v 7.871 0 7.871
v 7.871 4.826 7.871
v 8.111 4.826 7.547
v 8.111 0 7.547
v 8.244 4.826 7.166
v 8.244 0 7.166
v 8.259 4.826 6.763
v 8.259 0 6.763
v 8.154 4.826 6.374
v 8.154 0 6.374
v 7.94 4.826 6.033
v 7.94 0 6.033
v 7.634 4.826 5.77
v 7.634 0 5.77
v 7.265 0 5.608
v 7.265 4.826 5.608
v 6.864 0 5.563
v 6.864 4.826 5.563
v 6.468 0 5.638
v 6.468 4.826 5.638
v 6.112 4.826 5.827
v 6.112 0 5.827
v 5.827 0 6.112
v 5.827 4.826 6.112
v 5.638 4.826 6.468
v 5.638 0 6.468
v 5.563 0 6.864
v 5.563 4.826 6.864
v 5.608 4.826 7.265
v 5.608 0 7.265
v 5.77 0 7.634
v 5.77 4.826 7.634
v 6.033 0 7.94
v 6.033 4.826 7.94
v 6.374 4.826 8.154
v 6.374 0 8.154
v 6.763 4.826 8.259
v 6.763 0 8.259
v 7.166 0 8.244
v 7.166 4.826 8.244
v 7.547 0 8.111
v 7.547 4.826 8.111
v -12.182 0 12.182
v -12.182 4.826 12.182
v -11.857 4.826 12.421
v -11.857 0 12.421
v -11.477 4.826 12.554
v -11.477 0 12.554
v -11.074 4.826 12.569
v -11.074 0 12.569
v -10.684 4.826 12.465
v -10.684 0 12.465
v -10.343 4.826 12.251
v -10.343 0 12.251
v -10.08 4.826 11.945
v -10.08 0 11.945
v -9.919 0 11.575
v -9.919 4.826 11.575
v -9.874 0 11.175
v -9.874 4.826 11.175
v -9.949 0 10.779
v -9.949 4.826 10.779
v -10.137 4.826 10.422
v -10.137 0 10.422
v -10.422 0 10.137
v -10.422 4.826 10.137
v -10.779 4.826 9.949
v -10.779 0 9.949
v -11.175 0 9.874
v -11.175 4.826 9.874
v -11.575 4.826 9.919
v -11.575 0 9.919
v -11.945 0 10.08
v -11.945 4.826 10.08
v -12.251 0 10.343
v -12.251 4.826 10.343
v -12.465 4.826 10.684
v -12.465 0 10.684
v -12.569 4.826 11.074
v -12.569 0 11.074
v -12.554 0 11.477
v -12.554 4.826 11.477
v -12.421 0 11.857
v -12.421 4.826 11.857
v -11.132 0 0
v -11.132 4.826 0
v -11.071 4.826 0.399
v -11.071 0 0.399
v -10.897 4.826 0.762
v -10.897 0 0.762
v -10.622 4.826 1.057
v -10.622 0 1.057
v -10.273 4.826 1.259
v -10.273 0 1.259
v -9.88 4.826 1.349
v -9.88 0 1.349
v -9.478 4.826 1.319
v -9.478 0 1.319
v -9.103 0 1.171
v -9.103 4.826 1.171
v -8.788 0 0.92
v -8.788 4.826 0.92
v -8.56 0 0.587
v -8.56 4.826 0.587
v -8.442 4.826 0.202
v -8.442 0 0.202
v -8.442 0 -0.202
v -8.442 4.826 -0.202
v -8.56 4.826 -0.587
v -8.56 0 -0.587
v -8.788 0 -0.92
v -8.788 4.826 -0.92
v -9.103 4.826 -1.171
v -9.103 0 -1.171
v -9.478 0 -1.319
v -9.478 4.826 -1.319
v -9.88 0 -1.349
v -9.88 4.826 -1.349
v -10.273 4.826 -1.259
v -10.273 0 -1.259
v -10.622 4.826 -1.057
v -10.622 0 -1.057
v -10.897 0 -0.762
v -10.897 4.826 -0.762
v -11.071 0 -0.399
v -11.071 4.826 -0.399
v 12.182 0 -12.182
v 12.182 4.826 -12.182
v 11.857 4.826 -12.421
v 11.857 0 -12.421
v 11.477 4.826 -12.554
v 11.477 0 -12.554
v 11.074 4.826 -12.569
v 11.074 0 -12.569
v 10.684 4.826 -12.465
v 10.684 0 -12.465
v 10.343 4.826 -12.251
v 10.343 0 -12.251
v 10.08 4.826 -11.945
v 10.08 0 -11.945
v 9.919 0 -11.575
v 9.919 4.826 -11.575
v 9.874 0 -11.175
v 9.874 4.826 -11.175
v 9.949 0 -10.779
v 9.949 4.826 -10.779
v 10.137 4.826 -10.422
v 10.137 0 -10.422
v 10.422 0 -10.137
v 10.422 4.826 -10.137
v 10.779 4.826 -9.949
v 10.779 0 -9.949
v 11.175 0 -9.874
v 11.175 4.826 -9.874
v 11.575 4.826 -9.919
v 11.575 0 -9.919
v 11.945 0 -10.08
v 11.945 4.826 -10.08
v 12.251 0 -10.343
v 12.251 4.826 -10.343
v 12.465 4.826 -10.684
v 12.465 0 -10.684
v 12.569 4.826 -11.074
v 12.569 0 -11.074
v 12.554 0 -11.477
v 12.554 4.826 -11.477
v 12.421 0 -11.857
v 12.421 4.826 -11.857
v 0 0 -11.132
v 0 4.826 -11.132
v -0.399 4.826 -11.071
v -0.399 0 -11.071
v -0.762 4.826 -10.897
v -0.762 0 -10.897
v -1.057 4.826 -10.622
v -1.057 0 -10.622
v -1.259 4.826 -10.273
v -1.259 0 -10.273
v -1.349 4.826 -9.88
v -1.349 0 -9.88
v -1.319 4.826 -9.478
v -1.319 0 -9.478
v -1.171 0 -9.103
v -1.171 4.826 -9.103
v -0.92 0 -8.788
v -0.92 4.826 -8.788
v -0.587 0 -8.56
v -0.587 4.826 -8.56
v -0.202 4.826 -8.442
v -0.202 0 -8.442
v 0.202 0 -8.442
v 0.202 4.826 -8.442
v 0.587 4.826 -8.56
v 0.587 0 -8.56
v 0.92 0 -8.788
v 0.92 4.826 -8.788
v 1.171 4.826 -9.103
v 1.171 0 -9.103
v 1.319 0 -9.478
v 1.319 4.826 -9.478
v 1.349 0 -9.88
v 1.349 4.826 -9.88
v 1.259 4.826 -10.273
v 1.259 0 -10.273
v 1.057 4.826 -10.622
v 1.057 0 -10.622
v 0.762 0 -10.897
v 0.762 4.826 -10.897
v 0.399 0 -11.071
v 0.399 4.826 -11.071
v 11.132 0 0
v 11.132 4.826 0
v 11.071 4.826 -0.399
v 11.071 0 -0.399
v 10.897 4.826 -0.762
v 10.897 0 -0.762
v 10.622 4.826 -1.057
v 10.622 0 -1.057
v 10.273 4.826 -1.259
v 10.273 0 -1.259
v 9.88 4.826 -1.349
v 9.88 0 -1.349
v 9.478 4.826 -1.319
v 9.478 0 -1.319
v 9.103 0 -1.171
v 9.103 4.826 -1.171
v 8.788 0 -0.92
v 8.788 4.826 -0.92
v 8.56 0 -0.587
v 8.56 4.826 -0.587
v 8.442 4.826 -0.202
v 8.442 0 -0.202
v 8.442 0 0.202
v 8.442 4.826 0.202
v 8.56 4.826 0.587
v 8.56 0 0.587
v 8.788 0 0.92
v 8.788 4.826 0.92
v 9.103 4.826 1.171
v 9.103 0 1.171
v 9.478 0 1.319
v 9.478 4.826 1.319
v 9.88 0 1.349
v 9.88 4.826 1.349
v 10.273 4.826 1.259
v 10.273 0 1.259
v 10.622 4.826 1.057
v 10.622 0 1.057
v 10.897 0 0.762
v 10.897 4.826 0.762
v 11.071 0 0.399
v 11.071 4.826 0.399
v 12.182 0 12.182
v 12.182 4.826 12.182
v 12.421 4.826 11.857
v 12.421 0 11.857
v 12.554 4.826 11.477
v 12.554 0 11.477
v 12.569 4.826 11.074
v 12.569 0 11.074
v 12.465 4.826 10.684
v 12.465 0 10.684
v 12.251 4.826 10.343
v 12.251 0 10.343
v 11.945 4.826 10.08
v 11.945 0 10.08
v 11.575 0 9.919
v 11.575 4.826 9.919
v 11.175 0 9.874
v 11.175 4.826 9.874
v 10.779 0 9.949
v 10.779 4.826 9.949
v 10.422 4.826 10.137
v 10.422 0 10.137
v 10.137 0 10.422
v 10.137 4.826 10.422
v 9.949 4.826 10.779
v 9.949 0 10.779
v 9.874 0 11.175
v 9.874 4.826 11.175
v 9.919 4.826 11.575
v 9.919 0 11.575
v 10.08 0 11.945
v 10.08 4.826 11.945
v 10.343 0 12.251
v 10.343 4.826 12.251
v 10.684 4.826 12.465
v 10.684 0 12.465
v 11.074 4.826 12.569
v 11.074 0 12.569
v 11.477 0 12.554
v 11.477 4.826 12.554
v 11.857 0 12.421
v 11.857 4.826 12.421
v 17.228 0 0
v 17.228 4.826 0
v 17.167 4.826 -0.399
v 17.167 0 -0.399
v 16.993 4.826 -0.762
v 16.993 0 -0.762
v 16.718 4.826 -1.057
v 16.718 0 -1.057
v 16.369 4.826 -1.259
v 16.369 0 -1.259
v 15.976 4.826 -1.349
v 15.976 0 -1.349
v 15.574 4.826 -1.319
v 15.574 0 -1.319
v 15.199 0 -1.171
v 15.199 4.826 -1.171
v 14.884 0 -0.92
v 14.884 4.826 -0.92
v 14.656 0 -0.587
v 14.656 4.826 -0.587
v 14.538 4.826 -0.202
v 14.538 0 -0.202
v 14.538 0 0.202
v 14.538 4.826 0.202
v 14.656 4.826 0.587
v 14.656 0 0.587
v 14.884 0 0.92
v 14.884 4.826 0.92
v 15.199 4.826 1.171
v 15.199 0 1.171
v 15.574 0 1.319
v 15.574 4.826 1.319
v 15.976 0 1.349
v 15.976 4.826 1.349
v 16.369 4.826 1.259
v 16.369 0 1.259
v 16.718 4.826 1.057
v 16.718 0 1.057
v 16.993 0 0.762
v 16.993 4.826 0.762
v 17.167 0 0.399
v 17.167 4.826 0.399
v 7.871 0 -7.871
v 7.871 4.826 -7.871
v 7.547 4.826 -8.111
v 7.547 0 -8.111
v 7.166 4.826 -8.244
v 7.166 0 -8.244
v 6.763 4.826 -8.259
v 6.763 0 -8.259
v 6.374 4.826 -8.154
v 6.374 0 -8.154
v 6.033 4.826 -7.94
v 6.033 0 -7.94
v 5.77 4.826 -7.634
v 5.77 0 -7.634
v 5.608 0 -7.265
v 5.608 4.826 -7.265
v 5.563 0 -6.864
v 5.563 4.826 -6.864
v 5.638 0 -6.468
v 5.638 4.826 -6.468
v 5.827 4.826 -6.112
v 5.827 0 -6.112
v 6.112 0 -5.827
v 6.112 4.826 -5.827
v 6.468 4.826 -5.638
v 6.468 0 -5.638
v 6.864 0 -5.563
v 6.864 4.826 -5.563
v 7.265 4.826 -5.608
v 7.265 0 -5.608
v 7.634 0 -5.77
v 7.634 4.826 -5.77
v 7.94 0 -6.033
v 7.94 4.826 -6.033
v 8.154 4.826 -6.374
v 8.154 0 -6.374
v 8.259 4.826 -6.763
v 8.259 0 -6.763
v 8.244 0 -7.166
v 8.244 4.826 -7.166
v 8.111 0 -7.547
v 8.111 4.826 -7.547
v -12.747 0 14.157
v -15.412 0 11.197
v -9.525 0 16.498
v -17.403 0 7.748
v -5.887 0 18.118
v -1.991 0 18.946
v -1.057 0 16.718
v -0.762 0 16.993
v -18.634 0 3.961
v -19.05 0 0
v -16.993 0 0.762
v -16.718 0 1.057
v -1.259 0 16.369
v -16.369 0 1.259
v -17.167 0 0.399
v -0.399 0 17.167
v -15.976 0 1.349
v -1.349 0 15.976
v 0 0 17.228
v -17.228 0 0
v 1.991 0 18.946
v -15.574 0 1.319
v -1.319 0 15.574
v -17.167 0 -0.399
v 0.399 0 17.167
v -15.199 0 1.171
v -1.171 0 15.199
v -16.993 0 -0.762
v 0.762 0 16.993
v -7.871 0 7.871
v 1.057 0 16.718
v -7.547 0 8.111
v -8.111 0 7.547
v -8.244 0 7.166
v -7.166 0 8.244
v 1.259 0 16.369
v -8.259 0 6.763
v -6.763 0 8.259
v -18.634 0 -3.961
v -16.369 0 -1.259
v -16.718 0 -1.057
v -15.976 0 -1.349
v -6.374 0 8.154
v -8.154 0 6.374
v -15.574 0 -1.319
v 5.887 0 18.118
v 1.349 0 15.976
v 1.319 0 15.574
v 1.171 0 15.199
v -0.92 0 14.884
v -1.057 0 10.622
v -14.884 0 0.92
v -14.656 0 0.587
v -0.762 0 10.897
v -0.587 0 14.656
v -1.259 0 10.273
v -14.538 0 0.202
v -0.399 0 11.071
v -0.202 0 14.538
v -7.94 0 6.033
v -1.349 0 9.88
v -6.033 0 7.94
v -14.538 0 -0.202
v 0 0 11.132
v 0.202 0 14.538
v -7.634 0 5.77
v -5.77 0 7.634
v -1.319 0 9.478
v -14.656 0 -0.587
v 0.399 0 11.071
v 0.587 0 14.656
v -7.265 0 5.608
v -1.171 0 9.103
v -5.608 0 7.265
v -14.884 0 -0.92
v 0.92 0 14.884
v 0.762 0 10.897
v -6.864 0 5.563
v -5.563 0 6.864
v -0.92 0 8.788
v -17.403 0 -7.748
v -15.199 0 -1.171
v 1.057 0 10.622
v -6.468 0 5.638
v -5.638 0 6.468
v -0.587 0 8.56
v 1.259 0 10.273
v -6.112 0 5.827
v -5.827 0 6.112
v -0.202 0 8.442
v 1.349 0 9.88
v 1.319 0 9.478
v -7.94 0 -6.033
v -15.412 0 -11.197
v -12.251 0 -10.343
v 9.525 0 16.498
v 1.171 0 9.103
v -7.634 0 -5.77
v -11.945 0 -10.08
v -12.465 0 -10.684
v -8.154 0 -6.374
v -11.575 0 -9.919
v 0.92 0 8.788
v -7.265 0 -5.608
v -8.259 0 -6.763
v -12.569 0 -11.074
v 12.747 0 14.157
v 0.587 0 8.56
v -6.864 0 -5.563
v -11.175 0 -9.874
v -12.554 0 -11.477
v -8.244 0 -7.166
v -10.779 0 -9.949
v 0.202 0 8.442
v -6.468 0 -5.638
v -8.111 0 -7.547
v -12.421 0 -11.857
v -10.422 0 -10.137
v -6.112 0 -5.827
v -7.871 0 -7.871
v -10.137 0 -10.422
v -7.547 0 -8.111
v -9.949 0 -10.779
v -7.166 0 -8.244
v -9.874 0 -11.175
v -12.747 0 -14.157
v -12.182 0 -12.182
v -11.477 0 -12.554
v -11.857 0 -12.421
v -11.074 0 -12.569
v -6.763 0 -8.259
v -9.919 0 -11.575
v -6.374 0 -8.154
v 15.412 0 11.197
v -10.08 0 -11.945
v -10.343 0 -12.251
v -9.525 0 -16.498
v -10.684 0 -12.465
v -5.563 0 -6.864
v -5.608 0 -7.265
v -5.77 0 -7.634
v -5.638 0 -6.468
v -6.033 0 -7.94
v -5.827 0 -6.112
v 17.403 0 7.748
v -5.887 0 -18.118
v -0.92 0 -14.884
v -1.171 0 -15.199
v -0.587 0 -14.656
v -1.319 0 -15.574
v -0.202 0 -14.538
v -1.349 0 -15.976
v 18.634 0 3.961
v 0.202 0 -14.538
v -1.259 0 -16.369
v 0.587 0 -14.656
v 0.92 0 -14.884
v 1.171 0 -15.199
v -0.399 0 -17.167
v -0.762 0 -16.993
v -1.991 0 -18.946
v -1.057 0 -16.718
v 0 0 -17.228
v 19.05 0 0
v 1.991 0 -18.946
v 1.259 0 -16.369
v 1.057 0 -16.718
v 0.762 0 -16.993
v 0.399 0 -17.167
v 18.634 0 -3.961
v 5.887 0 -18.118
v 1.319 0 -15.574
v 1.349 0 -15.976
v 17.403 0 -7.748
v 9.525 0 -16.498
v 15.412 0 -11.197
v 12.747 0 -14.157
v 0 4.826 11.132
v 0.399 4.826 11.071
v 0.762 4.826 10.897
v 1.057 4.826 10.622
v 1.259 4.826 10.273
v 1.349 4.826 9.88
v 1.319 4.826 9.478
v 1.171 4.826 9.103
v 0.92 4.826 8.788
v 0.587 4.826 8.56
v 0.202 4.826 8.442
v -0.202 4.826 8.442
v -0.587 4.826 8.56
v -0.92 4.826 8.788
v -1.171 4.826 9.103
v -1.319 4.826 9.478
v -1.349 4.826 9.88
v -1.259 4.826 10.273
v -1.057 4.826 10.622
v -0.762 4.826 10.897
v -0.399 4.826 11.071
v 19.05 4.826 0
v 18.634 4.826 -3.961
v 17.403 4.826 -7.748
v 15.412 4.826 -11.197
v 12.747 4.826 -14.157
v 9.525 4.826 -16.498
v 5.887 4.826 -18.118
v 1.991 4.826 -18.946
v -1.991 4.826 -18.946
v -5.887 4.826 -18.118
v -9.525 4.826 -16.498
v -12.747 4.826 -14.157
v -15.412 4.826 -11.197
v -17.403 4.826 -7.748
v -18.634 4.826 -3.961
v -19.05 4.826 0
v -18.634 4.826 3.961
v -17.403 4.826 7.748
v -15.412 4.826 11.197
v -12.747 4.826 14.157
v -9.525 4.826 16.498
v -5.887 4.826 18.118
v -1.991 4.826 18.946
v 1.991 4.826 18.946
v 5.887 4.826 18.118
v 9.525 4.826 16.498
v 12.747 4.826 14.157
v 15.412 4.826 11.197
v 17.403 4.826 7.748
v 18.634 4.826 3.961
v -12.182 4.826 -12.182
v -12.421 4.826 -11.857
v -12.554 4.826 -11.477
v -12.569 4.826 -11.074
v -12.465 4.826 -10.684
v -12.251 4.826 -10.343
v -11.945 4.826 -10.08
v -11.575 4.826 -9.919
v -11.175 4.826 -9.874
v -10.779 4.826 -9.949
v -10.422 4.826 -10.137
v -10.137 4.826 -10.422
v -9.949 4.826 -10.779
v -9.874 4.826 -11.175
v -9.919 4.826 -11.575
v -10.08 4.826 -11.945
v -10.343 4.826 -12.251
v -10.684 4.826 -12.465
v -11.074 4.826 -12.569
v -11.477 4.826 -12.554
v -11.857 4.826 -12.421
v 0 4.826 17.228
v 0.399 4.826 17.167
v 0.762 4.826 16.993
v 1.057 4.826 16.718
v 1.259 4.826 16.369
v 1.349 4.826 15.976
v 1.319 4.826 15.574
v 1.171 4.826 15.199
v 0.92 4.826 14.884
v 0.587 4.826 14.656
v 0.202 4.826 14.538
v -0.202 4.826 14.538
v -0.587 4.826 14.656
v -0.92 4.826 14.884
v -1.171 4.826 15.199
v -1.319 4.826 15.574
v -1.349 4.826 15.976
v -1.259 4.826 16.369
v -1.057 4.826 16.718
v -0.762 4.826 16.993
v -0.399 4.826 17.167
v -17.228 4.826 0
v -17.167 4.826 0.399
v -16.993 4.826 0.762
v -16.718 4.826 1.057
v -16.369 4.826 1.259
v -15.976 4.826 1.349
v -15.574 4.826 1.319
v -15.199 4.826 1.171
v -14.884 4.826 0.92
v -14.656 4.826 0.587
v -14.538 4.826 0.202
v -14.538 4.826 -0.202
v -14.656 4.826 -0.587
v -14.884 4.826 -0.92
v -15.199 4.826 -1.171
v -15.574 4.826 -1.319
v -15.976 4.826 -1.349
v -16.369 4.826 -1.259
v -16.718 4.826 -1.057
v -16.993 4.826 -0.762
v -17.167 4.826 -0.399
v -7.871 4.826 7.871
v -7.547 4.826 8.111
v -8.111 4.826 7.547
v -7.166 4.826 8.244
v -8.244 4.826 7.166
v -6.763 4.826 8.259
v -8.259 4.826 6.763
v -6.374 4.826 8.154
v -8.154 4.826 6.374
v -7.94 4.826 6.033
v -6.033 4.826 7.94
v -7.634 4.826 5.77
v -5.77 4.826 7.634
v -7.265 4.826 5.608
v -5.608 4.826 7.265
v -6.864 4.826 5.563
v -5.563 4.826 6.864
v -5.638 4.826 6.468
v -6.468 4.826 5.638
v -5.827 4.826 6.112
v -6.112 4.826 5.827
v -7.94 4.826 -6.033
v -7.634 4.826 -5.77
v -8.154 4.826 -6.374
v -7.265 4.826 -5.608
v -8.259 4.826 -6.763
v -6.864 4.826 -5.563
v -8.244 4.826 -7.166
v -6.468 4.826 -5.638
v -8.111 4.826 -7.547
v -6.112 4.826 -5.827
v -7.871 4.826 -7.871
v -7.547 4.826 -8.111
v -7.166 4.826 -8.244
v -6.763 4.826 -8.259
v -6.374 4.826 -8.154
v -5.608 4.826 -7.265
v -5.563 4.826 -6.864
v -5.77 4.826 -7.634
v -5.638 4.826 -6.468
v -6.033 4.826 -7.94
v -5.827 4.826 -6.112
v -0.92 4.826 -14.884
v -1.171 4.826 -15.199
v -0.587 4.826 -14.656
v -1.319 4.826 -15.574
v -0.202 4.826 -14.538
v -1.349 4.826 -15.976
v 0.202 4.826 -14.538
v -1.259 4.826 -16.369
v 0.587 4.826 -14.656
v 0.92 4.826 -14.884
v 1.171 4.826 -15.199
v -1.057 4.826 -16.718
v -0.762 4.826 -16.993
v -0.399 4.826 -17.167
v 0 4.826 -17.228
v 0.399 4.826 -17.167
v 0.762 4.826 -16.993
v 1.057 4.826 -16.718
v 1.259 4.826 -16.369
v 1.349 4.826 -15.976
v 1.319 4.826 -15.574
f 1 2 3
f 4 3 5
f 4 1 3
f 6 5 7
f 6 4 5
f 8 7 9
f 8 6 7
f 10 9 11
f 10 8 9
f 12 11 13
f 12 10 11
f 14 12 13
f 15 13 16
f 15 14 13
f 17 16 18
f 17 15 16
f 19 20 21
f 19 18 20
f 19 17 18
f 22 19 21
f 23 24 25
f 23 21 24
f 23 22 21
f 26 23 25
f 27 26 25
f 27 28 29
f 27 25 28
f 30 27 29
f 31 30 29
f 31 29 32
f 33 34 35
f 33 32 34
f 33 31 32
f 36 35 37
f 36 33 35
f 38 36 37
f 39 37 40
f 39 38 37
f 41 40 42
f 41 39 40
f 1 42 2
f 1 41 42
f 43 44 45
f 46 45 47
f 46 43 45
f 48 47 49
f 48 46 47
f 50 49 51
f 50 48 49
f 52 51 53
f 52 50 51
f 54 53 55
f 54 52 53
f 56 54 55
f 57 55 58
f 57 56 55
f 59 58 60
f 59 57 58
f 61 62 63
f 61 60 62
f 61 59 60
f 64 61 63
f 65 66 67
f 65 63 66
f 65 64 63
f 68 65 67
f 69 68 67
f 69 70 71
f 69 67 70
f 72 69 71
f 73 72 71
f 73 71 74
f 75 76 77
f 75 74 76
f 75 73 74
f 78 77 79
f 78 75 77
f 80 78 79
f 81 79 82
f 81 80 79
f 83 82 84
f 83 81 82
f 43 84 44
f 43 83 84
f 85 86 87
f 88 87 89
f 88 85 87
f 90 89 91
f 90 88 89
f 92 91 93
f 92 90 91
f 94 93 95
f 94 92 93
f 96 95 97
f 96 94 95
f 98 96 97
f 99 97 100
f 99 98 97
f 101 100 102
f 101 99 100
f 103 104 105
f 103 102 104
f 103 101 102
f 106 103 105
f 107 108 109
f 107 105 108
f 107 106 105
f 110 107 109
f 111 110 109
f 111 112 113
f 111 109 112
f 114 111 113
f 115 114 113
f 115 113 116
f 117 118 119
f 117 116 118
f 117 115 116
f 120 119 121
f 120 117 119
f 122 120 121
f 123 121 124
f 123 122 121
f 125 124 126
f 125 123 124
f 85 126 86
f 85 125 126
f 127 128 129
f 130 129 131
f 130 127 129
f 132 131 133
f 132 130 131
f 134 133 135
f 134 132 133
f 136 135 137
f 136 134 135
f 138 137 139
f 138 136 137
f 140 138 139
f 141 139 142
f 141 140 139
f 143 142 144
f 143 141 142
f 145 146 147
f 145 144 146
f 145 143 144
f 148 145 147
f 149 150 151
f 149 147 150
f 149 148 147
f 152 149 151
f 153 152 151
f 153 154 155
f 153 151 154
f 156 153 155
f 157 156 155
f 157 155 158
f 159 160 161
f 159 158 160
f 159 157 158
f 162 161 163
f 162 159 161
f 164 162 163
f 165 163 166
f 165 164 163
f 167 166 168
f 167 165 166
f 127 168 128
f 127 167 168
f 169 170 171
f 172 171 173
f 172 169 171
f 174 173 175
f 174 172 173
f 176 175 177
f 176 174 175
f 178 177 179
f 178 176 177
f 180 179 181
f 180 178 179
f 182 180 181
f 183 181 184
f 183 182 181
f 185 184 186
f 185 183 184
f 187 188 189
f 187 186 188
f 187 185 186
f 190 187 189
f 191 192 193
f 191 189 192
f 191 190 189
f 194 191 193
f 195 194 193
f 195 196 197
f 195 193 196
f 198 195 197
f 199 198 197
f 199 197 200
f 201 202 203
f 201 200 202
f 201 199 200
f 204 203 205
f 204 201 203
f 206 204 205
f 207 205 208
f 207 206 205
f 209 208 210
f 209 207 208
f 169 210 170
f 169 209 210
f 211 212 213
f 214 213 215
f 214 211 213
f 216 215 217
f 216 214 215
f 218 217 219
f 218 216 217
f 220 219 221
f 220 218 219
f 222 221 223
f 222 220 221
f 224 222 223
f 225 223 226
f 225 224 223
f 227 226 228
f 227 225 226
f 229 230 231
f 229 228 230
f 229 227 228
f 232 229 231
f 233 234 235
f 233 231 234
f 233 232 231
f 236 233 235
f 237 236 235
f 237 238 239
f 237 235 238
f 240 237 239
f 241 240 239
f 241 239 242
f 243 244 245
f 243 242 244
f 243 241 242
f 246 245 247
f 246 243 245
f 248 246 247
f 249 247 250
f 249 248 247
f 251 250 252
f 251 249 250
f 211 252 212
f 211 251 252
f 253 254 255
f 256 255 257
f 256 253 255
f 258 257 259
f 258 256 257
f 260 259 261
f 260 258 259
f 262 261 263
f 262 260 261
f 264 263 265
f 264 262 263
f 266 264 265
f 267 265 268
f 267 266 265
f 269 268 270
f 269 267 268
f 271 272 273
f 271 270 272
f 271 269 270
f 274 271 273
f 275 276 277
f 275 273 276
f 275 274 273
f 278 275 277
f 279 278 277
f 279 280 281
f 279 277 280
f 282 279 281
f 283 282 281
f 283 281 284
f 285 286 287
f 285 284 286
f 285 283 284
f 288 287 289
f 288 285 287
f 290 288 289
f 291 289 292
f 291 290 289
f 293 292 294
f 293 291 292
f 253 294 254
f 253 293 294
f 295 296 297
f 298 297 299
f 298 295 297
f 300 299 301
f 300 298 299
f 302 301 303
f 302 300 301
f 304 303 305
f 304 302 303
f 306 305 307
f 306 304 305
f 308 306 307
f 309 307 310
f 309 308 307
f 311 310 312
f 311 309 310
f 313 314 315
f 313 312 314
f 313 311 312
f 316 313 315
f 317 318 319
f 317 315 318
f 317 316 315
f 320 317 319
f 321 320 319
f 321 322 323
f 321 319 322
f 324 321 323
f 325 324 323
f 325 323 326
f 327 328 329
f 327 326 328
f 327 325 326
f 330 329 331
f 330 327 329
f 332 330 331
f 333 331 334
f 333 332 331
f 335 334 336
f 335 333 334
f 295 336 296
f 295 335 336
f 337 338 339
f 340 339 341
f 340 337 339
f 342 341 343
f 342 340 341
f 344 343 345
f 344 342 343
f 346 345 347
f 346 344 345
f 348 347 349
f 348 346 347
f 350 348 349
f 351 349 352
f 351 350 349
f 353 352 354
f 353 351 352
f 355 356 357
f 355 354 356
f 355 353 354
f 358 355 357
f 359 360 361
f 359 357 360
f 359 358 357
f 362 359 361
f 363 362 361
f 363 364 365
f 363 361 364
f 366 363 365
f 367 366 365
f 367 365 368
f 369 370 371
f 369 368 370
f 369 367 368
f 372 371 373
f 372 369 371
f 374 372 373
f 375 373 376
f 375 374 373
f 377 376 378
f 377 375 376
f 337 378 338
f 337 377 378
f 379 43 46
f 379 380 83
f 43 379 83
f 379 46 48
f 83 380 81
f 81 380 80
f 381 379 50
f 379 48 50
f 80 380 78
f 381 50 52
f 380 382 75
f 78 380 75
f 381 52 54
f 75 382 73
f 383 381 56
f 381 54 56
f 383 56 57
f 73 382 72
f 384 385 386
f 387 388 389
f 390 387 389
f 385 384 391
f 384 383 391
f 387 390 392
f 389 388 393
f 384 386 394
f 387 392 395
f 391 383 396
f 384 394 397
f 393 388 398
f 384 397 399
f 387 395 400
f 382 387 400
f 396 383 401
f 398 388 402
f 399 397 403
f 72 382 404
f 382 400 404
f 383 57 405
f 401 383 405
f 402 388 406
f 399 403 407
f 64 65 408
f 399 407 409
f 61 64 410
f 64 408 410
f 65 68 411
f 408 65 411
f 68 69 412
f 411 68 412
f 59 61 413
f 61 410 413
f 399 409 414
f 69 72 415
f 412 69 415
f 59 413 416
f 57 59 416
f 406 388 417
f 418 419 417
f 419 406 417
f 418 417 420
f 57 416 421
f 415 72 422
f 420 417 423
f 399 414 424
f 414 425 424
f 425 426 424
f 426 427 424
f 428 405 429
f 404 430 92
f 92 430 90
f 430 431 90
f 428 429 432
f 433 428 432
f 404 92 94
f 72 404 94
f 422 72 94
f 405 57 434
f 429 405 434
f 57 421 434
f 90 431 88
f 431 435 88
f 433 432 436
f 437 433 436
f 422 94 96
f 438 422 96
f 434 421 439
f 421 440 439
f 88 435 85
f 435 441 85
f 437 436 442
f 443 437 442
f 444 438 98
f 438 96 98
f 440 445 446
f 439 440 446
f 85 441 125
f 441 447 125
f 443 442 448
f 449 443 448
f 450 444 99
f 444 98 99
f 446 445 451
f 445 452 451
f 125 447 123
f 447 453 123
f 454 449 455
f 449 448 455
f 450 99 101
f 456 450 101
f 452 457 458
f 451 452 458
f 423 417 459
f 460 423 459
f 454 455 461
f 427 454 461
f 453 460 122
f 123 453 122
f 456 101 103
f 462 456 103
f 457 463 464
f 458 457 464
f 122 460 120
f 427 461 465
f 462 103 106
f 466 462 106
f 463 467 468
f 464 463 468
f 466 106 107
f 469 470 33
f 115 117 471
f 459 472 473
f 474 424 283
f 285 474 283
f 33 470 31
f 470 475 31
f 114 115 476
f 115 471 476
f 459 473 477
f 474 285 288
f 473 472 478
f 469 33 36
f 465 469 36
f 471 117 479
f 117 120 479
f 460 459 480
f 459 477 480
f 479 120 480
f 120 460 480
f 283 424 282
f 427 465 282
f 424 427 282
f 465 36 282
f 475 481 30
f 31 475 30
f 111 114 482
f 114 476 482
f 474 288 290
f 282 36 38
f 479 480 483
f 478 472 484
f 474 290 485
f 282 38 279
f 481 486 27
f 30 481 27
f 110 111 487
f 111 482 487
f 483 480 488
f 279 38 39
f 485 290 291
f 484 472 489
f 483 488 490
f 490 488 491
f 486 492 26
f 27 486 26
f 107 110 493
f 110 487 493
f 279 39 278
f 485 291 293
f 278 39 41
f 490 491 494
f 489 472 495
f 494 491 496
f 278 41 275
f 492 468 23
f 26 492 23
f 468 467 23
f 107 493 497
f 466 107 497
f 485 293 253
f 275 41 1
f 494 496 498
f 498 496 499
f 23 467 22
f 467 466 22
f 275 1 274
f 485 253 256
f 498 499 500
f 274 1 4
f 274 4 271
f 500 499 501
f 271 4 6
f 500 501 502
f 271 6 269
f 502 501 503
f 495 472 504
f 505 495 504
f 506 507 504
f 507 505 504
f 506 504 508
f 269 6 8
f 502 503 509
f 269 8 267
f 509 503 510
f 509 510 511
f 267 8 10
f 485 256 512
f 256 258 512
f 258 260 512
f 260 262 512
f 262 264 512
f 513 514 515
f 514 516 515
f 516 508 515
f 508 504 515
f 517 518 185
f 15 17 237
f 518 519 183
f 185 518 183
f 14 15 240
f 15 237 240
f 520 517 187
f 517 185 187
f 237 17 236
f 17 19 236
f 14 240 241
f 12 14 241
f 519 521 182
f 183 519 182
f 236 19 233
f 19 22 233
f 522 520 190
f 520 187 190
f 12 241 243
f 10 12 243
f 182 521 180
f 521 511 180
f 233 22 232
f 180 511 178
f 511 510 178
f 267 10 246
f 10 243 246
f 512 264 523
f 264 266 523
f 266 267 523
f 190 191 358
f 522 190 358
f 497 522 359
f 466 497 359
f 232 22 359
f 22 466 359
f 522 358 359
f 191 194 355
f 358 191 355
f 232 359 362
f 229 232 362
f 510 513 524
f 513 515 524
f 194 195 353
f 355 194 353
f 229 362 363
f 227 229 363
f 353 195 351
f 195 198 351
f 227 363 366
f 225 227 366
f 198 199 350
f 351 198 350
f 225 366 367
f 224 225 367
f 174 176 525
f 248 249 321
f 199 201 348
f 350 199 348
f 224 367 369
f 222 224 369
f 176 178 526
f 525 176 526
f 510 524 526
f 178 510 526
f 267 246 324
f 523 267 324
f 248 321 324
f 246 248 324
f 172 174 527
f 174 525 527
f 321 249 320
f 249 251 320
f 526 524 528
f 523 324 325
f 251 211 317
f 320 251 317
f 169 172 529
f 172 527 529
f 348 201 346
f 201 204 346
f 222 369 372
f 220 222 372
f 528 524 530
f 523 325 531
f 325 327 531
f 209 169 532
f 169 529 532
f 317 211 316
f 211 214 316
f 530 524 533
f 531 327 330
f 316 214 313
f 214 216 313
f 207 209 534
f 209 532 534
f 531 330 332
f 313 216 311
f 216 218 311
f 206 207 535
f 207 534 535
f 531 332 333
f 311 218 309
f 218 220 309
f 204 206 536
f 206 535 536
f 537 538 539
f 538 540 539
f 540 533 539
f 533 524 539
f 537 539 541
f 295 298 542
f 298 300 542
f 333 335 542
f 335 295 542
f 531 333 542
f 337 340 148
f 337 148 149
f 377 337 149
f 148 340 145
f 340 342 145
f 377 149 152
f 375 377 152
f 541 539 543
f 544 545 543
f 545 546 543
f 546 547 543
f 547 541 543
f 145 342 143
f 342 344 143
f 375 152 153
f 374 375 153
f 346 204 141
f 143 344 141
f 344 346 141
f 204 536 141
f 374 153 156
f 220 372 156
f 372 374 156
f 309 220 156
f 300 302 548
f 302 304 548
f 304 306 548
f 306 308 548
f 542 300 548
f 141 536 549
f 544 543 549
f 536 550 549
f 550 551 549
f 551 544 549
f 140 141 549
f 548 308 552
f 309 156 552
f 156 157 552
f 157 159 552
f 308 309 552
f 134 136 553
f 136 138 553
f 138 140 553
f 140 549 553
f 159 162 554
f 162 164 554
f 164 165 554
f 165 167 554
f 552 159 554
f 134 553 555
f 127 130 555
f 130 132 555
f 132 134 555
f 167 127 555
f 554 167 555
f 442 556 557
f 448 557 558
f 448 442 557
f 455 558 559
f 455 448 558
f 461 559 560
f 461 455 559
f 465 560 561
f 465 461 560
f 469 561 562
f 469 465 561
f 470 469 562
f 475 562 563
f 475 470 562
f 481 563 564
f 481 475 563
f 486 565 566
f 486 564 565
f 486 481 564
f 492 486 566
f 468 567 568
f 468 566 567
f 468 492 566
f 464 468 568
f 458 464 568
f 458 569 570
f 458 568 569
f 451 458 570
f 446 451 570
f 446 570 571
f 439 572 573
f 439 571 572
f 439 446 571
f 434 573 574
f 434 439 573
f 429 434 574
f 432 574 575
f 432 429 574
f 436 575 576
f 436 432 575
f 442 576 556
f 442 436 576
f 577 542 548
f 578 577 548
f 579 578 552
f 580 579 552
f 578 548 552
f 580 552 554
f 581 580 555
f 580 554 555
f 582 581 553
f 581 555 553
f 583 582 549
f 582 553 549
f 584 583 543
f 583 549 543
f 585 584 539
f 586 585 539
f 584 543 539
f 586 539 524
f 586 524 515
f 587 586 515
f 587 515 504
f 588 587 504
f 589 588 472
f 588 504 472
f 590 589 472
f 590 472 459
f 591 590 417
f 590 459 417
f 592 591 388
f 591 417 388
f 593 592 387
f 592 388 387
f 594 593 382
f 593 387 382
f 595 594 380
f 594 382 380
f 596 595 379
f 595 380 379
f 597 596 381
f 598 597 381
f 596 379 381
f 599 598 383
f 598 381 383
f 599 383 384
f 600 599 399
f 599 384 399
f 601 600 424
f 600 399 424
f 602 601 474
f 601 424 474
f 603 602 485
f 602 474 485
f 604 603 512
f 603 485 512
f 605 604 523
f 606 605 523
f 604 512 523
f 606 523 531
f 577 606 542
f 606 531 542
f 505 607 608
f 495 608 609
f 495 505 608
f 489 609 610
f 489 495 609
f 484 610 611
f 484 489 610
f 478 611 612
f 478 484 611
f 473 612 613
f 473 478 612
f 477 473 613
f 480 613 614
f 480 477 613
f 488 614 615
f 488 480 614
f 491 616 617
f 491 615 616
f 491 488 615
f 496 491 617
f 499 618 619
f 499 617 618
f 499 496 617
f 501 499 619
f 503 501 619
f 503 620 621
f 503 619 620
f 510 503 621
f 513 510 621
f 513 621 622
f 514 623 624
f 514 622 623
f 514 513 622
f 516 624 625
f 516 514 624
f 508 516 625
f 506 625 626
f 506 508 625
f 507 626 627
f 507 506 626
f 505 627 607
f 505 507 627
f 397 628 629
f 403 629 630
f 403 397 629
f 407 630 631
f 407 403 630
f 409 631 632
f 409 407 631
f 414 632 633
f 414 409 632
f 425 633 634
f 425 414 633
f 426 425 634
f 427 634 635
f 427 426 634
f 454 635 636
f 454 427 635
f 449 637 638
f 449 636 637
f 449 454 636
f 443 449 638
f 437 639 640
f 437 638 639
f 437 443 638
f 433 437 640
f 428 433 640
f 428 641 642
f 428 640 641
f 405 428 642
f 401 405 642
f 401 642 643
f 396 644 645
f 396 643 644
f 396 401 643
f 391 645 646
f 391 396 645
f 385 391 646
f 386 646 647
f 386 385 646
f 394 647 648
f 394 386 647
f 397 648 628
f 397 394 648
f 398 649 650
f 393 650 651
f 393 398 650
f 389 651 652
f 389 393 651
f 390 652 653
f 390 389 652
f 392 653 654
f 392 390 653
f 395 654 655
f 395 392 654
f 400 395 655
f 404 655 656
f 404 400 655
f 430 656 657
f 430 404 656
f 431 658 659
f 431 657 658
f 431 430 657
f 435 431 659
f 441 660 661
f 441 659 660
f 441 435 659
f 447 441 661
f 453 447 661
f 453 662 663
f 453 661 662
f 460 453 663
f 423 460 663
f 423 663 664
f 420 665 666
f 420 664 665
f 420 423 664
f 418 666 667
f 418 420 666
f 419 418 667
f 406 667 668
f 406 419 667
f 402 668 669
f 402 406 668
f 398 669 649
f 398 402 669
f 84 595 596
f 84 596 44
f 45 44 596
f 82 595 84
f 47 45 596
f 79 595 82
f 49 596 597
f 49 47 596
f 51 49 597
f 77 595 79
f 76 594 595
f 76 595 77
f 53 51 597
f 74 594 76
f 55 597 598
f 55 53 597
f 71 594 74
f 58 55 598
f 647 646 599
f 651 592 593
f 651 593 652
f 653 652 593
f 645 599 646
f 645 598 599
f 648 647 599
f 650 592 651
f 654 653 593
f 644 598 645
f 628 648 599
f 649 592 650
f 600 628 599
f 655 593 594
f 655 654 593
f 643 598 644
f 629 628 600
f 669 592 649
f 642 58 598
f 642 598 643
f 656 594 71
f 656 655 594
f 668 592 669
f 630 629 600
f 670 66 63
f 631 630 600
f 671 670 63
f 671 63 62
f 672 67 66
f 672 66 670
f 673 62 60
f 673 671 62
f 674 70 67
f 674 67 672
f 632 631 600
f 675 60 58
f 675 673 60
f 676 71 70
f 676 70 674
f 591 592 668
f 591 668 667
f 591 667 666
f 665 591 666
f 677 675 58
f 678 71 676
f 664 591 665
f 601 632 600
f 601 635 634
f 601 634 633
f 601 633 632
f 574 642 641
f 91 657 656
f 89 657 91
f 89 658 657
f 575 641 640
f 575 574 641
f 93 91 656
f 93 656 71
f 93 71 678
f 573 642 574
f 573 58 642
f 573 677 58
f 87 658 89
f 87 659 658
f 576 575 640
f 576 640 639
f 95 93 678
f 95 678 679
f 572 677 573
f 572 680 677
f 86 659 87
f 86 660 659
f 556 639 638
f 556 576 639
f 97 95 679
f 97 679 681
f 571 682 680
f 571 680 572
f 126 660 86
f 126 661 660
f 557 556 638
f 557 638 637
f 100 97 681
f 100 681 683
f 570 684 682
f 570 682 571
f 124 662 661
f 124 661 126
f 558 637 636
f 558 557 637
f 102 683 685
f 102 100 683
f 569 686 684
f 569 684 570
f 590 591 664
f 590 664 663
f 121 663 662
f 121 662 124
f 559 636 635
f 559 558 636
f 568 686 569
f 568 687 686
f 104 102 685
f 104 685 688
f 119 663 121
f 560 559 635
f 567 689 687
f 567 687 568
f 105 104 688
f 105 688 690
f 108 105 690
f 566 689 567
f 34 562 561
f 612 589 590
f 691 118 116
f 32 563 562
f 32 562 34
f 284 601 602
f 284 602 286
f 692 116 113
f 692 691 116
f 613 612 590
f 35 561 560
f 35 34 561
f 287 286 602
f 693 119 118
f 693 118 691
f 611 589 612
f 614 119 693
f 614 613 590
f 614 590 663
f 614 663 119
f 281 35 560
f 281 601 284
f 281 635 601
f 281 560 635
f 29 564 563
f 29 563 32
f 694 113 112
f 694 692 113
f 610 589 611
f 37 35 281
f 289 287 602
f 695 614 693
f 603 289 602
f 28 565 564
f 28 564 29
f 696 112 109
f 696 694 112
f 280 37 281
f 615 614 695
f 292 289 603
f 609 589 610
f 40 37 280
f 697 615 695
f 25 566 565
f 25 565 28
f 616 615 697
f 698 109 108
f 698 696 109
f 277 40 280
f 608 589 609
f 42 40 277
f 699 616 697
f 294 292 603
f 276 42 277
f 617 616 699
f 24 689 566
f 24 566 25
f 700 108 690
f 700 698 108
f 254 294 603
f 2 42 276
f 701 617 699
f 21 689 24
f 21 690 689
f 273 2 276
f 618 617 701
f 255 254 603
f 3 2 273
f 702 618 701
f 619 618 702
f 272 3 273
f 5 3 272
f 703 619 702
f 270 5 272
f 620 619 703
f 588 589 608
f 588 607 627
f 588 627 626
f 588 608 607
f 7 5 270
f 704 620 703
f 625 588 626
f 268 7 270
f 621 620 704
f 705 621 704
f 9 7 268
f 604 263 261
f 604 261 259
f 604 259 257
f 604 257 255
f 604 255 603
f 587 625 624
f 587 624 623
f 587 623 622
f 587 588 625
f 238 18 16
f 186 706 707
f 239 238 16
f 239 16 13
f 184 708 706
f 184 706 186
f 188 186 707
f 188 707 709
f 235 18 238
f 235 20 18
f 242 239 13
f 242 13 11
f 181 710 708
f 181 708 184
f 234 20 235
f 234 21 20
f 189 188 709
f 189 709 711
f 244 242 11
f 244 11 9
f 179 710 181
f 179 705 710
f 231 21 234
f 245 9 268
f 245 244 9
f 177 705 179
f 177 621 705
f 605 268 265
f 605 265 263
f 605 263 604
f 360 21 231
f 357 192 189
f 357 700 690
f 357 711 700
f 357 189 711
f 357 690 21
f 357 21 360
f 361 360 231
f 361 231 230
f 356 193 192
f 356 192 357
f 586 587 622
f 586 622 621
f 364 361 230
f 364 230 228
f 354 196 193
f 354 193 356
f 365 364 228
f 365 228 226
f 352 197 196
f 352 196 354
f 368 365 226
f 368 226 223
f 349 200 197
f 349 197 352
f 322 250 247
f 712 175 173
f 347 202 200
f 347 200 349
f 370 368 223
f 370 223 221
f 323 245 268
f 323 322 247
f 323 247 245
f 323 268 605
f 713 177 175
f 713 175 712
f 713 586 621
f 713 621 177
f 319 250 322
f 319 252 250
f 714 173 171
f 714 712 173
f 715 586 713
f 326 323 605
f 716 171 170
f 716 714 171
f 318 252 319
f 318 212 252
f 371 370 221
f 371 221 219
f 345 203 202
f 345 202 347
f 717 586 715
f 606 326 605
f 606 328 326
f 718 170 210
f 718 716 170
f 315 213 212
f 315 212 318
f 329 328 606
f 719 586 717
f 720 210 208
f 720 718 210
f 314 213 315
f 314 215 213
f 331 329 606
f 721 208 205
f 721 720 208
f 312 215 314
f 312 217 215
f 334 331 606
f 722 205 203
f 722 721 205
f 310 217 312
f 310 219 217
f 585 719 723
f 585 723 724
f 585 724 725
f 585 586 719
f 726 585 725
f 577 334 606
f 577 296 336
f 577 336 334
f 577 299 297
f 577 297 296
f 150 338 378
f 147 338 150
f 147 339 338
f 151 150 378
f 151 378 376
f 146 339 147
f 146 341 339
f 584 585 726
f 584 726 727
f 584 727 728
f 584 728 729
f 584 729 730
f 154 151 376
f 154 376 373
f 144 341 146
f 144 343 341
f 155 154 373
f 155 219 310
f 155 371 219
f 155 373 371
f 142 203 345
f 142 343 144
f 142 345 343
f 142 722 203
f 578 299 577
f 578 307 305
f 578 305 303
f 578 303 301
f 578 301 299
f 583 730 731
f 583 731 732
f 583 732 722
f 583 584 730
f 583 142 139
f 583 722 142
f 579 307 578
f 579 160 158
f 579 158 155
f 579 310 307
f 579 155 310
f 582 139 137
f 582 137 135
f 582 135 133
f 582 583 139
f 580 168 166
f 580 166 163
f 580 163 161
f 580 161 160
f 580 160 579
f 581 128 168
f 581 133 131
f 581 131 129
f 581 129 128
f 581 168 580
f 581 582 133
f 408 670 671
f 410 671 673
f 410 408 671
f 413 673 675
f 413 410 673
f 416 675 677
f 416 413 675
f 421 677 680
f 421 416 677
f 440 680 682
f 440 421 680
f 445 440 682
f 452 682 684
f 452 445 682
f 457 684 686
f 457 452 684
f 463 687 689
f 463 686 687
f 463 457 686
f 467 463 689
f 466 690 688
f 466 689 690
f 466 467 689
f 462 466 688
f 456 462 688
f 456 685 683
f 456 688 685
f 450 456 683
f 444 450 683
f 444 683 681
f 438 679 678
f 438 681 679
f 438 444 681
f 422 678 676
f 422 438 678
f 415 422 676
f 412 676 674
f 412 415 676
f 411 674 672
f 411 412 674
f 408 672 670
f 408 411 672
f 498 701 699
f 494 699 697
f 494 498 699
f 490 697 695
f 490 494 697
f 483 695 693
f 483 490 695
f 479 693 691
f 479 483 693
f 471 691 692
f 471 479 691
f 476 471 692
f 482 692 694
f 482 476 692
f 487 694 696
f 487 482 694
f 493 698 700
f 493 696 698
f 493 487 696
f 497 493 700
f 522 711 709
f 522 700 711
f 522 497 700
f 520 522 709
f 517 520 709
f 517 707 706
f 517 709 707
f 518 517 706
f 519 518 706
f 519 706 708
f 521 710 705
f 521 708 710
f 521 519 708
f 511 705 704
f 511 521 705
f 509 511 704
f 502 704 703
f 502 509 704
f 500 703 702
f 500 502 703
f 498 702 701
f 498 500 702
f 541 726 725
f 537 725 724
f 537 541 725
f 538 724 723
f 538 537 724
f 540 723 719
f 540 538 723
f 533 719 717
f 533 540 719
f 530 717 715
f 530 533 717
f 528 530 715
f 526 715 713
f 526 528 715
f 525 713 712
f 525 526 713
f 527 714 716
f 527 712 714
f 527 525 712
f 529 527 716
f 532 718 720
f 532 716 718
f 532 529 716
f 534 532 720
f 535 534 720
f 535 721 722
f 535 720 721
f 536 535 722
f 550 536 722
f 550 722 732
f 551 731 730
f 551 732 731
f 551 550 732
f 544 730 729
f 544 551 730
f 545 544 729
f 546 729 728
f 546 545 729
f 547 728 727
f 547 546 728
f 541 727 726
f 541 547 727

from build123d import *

# Parameters (mm, degrees)
SKETCH1_R                       = 19.05
BOSS_EXTRUDE1_DEPTH             = 4.826
M2_5_CLEARANCE_HOLE2_AT_2_COUNT = 2
M2_5_CLEARANCE_HOLE2_AT_2_PITCH = 6.096
CIRPATTERN1_COUNT               = 8


with BuildPart() as part:
    # Sketch1 → Boss-Extrude1 (new body)
    with BuildSketch(Plane(origin=(0, 0, 0), x_dir=(1, 0, 0), z_dir=(0, 1, 0))):
        Circle(SKETCH1_R)
    extrude(amount=BOSS_EXTRUDE1_DEPTH)

    # Sketch11 → M2.5 Clearance Hole2 (revolve, cut)
    with BuildSketch(Plane(origin=(0, 0, -15.875), x_dir=(0, 0, -1), z_dir=(1, 0, 0))):
        Polygon((0, 0), (0, 5.89269403), (1.35255, 5.08), (1.35255, 0), align=None)
    m2_5_clearance_hole2 = revolve(axis=Axis((0, -6.35, -15.875), (0, 1, 0)), mode=Mode.SUBTRACT)

    # M2.5 Clearance Hole2 at 2: M2.5 Clearance Hole2 ×2
    with Locations(*[(0, 0, i * M2_5_CLEARANCE_HOLE2_AT_2_PITCH) for i in range(1, M2_5_CLEARANCE_HOLE2_AT_2_COUNT)]):
        add(m2_5_clearance_hole2, mode=Mode.SUBTRACT)

    # CirPattern1: M2.5 Clearance Hole2 ×8 about axis
    cirpattern1_axis = Axis((0, 0, 0), (0, 1, 0))
    for i in range(1, CIRPATTERN1_COUNT):
        add(m2_5_clearance_hole2.rotate(cirpattern1_axis, i * 360 / CIRPATTERN1_COUNT), mode=Mode.SUBTRACT)

    # CirPattern1 copy 1 sketch → CirPattern1 copy 1 (revolve, cut)
    with BuildSketch(Plane(origin=(-6.914797213, 0, -6.914797213), x_dir=(-0.707106781, 0, -0.707106781), z_dir=(0.707106781, 0, -0.707106781))):
        Polygon((0, 0), (0, 5.89269403), (1.35255, 5.08), (1.35255, 0), align=None)
    revolve(axis=Axis((-6.914797213, -6.35, -6.914797213), (0, 1, 0)), mode=Mode.SUBTRACT)

    # CirPattern1 copy 2 sketch → CirPattern1 copy 2 (revolve, cut)
    with BuildSketch(Plane(origin=(-9.779, 0, 0), x_dir=(-1, 0, 0), z_dir=(0, 0, -1))):
        Polygon((0, 0), (0, 5.89269403), (1.35255, 5.08), (1.35255, 0), align=None)
    revolve(axis=Axis((-9.779, -6.35, 0), (0, 1, 0)), mode=Mode.SUBTRACT)

    # CirPattern1 copy 3 sketch → CirPattern1 copy 3 (revolve, cut)
    with BuildSketch(Plane(origin=(-6.914797213, 0, 6.914797213), x_dir=(-0.707106781, 0, 0.707106781), z_dir=(-0.707106781, 0, -0.707106781))):
        Polygon((0, 0), (0, 5.89269403), (1.35255, 5.08), (1.35255, 0), align=None)
    revolve(axis=Axis((-6.914797213, -6.35, 6.914797213), (0, 1, 0)), mode=Mode.SUBTRACT)

    # CirPattern1 copy 4 sketch → CirPattern1 copy 4 (revolve, cut)
    with BuildSketch(Plane(origin=(0, 0, 9.779), x_dir=(0, 0, 1), z_dir=(-1, 0, 0))):
        Polygon((0, 0), (0, 5.89269403), (1.35255, 5.08), (1.35255, 0), align=None)
    revolve(axis=Axis((0, -6.35, 9.779), (0, 1, 0)), mode=Mode.SUBTRACT)

    # CirPattern1 copy 5 sketch → CirPattern1 copy 5 (revolve, cut)
    with BuildSketch(Plane(origin=(6.914797213, 0, 6.914797213), x_dir=(0.707106781, 0, 0.707106781), z_dir=(-0.707106781, 0, 0.707106781))):
        Polygon((0, 0), (0, 5.89269403), (1.35255, 5.08), (1.35255, 0), align=None)
    revolve(axis=Axis((6.914797213, -6.35, 6.914797213), (0, 1, 0)), mode=Mode.SUBTRACT)

    # CirPattern1 copy 6 sketch → CirPattern1 copy 6 (revolve, cut)
    with BuildSketch(Plane(origin=(9.779, 0, 0), x_dir=(1, 0, 0), z_dir=(0, 0, 1))):
        Polygon((0, 0), (0, 5.89269403), (1.35255, 5.08), (1.35255, 0), align=None)
    revolve(axis=Axis((9.779, -6.35, 0), (0, 1, 0)), mode=Mode.SUBTRACT)

    # CirPattern1 copy 7 sketch → CirPattern1 copy 7 (revolve, cut)
    with BuildSketch(Plane(origin=(6.914797213, 0, -6.914797213), x_dir=(0.707106781, 0, -0.707106781), z_dir=(0.707106781, 0, 0.707106781))):
        Polygon((0, 0), (0, 5.89269403), (1.35255, 5.08), (1.35255, 0), align=None)
    revolve(axis=Axis((6.914797213, -6.35, -6.914797213), (0, 1, 0)), mode=Mode.SUBTRACT)


solid = part.part
